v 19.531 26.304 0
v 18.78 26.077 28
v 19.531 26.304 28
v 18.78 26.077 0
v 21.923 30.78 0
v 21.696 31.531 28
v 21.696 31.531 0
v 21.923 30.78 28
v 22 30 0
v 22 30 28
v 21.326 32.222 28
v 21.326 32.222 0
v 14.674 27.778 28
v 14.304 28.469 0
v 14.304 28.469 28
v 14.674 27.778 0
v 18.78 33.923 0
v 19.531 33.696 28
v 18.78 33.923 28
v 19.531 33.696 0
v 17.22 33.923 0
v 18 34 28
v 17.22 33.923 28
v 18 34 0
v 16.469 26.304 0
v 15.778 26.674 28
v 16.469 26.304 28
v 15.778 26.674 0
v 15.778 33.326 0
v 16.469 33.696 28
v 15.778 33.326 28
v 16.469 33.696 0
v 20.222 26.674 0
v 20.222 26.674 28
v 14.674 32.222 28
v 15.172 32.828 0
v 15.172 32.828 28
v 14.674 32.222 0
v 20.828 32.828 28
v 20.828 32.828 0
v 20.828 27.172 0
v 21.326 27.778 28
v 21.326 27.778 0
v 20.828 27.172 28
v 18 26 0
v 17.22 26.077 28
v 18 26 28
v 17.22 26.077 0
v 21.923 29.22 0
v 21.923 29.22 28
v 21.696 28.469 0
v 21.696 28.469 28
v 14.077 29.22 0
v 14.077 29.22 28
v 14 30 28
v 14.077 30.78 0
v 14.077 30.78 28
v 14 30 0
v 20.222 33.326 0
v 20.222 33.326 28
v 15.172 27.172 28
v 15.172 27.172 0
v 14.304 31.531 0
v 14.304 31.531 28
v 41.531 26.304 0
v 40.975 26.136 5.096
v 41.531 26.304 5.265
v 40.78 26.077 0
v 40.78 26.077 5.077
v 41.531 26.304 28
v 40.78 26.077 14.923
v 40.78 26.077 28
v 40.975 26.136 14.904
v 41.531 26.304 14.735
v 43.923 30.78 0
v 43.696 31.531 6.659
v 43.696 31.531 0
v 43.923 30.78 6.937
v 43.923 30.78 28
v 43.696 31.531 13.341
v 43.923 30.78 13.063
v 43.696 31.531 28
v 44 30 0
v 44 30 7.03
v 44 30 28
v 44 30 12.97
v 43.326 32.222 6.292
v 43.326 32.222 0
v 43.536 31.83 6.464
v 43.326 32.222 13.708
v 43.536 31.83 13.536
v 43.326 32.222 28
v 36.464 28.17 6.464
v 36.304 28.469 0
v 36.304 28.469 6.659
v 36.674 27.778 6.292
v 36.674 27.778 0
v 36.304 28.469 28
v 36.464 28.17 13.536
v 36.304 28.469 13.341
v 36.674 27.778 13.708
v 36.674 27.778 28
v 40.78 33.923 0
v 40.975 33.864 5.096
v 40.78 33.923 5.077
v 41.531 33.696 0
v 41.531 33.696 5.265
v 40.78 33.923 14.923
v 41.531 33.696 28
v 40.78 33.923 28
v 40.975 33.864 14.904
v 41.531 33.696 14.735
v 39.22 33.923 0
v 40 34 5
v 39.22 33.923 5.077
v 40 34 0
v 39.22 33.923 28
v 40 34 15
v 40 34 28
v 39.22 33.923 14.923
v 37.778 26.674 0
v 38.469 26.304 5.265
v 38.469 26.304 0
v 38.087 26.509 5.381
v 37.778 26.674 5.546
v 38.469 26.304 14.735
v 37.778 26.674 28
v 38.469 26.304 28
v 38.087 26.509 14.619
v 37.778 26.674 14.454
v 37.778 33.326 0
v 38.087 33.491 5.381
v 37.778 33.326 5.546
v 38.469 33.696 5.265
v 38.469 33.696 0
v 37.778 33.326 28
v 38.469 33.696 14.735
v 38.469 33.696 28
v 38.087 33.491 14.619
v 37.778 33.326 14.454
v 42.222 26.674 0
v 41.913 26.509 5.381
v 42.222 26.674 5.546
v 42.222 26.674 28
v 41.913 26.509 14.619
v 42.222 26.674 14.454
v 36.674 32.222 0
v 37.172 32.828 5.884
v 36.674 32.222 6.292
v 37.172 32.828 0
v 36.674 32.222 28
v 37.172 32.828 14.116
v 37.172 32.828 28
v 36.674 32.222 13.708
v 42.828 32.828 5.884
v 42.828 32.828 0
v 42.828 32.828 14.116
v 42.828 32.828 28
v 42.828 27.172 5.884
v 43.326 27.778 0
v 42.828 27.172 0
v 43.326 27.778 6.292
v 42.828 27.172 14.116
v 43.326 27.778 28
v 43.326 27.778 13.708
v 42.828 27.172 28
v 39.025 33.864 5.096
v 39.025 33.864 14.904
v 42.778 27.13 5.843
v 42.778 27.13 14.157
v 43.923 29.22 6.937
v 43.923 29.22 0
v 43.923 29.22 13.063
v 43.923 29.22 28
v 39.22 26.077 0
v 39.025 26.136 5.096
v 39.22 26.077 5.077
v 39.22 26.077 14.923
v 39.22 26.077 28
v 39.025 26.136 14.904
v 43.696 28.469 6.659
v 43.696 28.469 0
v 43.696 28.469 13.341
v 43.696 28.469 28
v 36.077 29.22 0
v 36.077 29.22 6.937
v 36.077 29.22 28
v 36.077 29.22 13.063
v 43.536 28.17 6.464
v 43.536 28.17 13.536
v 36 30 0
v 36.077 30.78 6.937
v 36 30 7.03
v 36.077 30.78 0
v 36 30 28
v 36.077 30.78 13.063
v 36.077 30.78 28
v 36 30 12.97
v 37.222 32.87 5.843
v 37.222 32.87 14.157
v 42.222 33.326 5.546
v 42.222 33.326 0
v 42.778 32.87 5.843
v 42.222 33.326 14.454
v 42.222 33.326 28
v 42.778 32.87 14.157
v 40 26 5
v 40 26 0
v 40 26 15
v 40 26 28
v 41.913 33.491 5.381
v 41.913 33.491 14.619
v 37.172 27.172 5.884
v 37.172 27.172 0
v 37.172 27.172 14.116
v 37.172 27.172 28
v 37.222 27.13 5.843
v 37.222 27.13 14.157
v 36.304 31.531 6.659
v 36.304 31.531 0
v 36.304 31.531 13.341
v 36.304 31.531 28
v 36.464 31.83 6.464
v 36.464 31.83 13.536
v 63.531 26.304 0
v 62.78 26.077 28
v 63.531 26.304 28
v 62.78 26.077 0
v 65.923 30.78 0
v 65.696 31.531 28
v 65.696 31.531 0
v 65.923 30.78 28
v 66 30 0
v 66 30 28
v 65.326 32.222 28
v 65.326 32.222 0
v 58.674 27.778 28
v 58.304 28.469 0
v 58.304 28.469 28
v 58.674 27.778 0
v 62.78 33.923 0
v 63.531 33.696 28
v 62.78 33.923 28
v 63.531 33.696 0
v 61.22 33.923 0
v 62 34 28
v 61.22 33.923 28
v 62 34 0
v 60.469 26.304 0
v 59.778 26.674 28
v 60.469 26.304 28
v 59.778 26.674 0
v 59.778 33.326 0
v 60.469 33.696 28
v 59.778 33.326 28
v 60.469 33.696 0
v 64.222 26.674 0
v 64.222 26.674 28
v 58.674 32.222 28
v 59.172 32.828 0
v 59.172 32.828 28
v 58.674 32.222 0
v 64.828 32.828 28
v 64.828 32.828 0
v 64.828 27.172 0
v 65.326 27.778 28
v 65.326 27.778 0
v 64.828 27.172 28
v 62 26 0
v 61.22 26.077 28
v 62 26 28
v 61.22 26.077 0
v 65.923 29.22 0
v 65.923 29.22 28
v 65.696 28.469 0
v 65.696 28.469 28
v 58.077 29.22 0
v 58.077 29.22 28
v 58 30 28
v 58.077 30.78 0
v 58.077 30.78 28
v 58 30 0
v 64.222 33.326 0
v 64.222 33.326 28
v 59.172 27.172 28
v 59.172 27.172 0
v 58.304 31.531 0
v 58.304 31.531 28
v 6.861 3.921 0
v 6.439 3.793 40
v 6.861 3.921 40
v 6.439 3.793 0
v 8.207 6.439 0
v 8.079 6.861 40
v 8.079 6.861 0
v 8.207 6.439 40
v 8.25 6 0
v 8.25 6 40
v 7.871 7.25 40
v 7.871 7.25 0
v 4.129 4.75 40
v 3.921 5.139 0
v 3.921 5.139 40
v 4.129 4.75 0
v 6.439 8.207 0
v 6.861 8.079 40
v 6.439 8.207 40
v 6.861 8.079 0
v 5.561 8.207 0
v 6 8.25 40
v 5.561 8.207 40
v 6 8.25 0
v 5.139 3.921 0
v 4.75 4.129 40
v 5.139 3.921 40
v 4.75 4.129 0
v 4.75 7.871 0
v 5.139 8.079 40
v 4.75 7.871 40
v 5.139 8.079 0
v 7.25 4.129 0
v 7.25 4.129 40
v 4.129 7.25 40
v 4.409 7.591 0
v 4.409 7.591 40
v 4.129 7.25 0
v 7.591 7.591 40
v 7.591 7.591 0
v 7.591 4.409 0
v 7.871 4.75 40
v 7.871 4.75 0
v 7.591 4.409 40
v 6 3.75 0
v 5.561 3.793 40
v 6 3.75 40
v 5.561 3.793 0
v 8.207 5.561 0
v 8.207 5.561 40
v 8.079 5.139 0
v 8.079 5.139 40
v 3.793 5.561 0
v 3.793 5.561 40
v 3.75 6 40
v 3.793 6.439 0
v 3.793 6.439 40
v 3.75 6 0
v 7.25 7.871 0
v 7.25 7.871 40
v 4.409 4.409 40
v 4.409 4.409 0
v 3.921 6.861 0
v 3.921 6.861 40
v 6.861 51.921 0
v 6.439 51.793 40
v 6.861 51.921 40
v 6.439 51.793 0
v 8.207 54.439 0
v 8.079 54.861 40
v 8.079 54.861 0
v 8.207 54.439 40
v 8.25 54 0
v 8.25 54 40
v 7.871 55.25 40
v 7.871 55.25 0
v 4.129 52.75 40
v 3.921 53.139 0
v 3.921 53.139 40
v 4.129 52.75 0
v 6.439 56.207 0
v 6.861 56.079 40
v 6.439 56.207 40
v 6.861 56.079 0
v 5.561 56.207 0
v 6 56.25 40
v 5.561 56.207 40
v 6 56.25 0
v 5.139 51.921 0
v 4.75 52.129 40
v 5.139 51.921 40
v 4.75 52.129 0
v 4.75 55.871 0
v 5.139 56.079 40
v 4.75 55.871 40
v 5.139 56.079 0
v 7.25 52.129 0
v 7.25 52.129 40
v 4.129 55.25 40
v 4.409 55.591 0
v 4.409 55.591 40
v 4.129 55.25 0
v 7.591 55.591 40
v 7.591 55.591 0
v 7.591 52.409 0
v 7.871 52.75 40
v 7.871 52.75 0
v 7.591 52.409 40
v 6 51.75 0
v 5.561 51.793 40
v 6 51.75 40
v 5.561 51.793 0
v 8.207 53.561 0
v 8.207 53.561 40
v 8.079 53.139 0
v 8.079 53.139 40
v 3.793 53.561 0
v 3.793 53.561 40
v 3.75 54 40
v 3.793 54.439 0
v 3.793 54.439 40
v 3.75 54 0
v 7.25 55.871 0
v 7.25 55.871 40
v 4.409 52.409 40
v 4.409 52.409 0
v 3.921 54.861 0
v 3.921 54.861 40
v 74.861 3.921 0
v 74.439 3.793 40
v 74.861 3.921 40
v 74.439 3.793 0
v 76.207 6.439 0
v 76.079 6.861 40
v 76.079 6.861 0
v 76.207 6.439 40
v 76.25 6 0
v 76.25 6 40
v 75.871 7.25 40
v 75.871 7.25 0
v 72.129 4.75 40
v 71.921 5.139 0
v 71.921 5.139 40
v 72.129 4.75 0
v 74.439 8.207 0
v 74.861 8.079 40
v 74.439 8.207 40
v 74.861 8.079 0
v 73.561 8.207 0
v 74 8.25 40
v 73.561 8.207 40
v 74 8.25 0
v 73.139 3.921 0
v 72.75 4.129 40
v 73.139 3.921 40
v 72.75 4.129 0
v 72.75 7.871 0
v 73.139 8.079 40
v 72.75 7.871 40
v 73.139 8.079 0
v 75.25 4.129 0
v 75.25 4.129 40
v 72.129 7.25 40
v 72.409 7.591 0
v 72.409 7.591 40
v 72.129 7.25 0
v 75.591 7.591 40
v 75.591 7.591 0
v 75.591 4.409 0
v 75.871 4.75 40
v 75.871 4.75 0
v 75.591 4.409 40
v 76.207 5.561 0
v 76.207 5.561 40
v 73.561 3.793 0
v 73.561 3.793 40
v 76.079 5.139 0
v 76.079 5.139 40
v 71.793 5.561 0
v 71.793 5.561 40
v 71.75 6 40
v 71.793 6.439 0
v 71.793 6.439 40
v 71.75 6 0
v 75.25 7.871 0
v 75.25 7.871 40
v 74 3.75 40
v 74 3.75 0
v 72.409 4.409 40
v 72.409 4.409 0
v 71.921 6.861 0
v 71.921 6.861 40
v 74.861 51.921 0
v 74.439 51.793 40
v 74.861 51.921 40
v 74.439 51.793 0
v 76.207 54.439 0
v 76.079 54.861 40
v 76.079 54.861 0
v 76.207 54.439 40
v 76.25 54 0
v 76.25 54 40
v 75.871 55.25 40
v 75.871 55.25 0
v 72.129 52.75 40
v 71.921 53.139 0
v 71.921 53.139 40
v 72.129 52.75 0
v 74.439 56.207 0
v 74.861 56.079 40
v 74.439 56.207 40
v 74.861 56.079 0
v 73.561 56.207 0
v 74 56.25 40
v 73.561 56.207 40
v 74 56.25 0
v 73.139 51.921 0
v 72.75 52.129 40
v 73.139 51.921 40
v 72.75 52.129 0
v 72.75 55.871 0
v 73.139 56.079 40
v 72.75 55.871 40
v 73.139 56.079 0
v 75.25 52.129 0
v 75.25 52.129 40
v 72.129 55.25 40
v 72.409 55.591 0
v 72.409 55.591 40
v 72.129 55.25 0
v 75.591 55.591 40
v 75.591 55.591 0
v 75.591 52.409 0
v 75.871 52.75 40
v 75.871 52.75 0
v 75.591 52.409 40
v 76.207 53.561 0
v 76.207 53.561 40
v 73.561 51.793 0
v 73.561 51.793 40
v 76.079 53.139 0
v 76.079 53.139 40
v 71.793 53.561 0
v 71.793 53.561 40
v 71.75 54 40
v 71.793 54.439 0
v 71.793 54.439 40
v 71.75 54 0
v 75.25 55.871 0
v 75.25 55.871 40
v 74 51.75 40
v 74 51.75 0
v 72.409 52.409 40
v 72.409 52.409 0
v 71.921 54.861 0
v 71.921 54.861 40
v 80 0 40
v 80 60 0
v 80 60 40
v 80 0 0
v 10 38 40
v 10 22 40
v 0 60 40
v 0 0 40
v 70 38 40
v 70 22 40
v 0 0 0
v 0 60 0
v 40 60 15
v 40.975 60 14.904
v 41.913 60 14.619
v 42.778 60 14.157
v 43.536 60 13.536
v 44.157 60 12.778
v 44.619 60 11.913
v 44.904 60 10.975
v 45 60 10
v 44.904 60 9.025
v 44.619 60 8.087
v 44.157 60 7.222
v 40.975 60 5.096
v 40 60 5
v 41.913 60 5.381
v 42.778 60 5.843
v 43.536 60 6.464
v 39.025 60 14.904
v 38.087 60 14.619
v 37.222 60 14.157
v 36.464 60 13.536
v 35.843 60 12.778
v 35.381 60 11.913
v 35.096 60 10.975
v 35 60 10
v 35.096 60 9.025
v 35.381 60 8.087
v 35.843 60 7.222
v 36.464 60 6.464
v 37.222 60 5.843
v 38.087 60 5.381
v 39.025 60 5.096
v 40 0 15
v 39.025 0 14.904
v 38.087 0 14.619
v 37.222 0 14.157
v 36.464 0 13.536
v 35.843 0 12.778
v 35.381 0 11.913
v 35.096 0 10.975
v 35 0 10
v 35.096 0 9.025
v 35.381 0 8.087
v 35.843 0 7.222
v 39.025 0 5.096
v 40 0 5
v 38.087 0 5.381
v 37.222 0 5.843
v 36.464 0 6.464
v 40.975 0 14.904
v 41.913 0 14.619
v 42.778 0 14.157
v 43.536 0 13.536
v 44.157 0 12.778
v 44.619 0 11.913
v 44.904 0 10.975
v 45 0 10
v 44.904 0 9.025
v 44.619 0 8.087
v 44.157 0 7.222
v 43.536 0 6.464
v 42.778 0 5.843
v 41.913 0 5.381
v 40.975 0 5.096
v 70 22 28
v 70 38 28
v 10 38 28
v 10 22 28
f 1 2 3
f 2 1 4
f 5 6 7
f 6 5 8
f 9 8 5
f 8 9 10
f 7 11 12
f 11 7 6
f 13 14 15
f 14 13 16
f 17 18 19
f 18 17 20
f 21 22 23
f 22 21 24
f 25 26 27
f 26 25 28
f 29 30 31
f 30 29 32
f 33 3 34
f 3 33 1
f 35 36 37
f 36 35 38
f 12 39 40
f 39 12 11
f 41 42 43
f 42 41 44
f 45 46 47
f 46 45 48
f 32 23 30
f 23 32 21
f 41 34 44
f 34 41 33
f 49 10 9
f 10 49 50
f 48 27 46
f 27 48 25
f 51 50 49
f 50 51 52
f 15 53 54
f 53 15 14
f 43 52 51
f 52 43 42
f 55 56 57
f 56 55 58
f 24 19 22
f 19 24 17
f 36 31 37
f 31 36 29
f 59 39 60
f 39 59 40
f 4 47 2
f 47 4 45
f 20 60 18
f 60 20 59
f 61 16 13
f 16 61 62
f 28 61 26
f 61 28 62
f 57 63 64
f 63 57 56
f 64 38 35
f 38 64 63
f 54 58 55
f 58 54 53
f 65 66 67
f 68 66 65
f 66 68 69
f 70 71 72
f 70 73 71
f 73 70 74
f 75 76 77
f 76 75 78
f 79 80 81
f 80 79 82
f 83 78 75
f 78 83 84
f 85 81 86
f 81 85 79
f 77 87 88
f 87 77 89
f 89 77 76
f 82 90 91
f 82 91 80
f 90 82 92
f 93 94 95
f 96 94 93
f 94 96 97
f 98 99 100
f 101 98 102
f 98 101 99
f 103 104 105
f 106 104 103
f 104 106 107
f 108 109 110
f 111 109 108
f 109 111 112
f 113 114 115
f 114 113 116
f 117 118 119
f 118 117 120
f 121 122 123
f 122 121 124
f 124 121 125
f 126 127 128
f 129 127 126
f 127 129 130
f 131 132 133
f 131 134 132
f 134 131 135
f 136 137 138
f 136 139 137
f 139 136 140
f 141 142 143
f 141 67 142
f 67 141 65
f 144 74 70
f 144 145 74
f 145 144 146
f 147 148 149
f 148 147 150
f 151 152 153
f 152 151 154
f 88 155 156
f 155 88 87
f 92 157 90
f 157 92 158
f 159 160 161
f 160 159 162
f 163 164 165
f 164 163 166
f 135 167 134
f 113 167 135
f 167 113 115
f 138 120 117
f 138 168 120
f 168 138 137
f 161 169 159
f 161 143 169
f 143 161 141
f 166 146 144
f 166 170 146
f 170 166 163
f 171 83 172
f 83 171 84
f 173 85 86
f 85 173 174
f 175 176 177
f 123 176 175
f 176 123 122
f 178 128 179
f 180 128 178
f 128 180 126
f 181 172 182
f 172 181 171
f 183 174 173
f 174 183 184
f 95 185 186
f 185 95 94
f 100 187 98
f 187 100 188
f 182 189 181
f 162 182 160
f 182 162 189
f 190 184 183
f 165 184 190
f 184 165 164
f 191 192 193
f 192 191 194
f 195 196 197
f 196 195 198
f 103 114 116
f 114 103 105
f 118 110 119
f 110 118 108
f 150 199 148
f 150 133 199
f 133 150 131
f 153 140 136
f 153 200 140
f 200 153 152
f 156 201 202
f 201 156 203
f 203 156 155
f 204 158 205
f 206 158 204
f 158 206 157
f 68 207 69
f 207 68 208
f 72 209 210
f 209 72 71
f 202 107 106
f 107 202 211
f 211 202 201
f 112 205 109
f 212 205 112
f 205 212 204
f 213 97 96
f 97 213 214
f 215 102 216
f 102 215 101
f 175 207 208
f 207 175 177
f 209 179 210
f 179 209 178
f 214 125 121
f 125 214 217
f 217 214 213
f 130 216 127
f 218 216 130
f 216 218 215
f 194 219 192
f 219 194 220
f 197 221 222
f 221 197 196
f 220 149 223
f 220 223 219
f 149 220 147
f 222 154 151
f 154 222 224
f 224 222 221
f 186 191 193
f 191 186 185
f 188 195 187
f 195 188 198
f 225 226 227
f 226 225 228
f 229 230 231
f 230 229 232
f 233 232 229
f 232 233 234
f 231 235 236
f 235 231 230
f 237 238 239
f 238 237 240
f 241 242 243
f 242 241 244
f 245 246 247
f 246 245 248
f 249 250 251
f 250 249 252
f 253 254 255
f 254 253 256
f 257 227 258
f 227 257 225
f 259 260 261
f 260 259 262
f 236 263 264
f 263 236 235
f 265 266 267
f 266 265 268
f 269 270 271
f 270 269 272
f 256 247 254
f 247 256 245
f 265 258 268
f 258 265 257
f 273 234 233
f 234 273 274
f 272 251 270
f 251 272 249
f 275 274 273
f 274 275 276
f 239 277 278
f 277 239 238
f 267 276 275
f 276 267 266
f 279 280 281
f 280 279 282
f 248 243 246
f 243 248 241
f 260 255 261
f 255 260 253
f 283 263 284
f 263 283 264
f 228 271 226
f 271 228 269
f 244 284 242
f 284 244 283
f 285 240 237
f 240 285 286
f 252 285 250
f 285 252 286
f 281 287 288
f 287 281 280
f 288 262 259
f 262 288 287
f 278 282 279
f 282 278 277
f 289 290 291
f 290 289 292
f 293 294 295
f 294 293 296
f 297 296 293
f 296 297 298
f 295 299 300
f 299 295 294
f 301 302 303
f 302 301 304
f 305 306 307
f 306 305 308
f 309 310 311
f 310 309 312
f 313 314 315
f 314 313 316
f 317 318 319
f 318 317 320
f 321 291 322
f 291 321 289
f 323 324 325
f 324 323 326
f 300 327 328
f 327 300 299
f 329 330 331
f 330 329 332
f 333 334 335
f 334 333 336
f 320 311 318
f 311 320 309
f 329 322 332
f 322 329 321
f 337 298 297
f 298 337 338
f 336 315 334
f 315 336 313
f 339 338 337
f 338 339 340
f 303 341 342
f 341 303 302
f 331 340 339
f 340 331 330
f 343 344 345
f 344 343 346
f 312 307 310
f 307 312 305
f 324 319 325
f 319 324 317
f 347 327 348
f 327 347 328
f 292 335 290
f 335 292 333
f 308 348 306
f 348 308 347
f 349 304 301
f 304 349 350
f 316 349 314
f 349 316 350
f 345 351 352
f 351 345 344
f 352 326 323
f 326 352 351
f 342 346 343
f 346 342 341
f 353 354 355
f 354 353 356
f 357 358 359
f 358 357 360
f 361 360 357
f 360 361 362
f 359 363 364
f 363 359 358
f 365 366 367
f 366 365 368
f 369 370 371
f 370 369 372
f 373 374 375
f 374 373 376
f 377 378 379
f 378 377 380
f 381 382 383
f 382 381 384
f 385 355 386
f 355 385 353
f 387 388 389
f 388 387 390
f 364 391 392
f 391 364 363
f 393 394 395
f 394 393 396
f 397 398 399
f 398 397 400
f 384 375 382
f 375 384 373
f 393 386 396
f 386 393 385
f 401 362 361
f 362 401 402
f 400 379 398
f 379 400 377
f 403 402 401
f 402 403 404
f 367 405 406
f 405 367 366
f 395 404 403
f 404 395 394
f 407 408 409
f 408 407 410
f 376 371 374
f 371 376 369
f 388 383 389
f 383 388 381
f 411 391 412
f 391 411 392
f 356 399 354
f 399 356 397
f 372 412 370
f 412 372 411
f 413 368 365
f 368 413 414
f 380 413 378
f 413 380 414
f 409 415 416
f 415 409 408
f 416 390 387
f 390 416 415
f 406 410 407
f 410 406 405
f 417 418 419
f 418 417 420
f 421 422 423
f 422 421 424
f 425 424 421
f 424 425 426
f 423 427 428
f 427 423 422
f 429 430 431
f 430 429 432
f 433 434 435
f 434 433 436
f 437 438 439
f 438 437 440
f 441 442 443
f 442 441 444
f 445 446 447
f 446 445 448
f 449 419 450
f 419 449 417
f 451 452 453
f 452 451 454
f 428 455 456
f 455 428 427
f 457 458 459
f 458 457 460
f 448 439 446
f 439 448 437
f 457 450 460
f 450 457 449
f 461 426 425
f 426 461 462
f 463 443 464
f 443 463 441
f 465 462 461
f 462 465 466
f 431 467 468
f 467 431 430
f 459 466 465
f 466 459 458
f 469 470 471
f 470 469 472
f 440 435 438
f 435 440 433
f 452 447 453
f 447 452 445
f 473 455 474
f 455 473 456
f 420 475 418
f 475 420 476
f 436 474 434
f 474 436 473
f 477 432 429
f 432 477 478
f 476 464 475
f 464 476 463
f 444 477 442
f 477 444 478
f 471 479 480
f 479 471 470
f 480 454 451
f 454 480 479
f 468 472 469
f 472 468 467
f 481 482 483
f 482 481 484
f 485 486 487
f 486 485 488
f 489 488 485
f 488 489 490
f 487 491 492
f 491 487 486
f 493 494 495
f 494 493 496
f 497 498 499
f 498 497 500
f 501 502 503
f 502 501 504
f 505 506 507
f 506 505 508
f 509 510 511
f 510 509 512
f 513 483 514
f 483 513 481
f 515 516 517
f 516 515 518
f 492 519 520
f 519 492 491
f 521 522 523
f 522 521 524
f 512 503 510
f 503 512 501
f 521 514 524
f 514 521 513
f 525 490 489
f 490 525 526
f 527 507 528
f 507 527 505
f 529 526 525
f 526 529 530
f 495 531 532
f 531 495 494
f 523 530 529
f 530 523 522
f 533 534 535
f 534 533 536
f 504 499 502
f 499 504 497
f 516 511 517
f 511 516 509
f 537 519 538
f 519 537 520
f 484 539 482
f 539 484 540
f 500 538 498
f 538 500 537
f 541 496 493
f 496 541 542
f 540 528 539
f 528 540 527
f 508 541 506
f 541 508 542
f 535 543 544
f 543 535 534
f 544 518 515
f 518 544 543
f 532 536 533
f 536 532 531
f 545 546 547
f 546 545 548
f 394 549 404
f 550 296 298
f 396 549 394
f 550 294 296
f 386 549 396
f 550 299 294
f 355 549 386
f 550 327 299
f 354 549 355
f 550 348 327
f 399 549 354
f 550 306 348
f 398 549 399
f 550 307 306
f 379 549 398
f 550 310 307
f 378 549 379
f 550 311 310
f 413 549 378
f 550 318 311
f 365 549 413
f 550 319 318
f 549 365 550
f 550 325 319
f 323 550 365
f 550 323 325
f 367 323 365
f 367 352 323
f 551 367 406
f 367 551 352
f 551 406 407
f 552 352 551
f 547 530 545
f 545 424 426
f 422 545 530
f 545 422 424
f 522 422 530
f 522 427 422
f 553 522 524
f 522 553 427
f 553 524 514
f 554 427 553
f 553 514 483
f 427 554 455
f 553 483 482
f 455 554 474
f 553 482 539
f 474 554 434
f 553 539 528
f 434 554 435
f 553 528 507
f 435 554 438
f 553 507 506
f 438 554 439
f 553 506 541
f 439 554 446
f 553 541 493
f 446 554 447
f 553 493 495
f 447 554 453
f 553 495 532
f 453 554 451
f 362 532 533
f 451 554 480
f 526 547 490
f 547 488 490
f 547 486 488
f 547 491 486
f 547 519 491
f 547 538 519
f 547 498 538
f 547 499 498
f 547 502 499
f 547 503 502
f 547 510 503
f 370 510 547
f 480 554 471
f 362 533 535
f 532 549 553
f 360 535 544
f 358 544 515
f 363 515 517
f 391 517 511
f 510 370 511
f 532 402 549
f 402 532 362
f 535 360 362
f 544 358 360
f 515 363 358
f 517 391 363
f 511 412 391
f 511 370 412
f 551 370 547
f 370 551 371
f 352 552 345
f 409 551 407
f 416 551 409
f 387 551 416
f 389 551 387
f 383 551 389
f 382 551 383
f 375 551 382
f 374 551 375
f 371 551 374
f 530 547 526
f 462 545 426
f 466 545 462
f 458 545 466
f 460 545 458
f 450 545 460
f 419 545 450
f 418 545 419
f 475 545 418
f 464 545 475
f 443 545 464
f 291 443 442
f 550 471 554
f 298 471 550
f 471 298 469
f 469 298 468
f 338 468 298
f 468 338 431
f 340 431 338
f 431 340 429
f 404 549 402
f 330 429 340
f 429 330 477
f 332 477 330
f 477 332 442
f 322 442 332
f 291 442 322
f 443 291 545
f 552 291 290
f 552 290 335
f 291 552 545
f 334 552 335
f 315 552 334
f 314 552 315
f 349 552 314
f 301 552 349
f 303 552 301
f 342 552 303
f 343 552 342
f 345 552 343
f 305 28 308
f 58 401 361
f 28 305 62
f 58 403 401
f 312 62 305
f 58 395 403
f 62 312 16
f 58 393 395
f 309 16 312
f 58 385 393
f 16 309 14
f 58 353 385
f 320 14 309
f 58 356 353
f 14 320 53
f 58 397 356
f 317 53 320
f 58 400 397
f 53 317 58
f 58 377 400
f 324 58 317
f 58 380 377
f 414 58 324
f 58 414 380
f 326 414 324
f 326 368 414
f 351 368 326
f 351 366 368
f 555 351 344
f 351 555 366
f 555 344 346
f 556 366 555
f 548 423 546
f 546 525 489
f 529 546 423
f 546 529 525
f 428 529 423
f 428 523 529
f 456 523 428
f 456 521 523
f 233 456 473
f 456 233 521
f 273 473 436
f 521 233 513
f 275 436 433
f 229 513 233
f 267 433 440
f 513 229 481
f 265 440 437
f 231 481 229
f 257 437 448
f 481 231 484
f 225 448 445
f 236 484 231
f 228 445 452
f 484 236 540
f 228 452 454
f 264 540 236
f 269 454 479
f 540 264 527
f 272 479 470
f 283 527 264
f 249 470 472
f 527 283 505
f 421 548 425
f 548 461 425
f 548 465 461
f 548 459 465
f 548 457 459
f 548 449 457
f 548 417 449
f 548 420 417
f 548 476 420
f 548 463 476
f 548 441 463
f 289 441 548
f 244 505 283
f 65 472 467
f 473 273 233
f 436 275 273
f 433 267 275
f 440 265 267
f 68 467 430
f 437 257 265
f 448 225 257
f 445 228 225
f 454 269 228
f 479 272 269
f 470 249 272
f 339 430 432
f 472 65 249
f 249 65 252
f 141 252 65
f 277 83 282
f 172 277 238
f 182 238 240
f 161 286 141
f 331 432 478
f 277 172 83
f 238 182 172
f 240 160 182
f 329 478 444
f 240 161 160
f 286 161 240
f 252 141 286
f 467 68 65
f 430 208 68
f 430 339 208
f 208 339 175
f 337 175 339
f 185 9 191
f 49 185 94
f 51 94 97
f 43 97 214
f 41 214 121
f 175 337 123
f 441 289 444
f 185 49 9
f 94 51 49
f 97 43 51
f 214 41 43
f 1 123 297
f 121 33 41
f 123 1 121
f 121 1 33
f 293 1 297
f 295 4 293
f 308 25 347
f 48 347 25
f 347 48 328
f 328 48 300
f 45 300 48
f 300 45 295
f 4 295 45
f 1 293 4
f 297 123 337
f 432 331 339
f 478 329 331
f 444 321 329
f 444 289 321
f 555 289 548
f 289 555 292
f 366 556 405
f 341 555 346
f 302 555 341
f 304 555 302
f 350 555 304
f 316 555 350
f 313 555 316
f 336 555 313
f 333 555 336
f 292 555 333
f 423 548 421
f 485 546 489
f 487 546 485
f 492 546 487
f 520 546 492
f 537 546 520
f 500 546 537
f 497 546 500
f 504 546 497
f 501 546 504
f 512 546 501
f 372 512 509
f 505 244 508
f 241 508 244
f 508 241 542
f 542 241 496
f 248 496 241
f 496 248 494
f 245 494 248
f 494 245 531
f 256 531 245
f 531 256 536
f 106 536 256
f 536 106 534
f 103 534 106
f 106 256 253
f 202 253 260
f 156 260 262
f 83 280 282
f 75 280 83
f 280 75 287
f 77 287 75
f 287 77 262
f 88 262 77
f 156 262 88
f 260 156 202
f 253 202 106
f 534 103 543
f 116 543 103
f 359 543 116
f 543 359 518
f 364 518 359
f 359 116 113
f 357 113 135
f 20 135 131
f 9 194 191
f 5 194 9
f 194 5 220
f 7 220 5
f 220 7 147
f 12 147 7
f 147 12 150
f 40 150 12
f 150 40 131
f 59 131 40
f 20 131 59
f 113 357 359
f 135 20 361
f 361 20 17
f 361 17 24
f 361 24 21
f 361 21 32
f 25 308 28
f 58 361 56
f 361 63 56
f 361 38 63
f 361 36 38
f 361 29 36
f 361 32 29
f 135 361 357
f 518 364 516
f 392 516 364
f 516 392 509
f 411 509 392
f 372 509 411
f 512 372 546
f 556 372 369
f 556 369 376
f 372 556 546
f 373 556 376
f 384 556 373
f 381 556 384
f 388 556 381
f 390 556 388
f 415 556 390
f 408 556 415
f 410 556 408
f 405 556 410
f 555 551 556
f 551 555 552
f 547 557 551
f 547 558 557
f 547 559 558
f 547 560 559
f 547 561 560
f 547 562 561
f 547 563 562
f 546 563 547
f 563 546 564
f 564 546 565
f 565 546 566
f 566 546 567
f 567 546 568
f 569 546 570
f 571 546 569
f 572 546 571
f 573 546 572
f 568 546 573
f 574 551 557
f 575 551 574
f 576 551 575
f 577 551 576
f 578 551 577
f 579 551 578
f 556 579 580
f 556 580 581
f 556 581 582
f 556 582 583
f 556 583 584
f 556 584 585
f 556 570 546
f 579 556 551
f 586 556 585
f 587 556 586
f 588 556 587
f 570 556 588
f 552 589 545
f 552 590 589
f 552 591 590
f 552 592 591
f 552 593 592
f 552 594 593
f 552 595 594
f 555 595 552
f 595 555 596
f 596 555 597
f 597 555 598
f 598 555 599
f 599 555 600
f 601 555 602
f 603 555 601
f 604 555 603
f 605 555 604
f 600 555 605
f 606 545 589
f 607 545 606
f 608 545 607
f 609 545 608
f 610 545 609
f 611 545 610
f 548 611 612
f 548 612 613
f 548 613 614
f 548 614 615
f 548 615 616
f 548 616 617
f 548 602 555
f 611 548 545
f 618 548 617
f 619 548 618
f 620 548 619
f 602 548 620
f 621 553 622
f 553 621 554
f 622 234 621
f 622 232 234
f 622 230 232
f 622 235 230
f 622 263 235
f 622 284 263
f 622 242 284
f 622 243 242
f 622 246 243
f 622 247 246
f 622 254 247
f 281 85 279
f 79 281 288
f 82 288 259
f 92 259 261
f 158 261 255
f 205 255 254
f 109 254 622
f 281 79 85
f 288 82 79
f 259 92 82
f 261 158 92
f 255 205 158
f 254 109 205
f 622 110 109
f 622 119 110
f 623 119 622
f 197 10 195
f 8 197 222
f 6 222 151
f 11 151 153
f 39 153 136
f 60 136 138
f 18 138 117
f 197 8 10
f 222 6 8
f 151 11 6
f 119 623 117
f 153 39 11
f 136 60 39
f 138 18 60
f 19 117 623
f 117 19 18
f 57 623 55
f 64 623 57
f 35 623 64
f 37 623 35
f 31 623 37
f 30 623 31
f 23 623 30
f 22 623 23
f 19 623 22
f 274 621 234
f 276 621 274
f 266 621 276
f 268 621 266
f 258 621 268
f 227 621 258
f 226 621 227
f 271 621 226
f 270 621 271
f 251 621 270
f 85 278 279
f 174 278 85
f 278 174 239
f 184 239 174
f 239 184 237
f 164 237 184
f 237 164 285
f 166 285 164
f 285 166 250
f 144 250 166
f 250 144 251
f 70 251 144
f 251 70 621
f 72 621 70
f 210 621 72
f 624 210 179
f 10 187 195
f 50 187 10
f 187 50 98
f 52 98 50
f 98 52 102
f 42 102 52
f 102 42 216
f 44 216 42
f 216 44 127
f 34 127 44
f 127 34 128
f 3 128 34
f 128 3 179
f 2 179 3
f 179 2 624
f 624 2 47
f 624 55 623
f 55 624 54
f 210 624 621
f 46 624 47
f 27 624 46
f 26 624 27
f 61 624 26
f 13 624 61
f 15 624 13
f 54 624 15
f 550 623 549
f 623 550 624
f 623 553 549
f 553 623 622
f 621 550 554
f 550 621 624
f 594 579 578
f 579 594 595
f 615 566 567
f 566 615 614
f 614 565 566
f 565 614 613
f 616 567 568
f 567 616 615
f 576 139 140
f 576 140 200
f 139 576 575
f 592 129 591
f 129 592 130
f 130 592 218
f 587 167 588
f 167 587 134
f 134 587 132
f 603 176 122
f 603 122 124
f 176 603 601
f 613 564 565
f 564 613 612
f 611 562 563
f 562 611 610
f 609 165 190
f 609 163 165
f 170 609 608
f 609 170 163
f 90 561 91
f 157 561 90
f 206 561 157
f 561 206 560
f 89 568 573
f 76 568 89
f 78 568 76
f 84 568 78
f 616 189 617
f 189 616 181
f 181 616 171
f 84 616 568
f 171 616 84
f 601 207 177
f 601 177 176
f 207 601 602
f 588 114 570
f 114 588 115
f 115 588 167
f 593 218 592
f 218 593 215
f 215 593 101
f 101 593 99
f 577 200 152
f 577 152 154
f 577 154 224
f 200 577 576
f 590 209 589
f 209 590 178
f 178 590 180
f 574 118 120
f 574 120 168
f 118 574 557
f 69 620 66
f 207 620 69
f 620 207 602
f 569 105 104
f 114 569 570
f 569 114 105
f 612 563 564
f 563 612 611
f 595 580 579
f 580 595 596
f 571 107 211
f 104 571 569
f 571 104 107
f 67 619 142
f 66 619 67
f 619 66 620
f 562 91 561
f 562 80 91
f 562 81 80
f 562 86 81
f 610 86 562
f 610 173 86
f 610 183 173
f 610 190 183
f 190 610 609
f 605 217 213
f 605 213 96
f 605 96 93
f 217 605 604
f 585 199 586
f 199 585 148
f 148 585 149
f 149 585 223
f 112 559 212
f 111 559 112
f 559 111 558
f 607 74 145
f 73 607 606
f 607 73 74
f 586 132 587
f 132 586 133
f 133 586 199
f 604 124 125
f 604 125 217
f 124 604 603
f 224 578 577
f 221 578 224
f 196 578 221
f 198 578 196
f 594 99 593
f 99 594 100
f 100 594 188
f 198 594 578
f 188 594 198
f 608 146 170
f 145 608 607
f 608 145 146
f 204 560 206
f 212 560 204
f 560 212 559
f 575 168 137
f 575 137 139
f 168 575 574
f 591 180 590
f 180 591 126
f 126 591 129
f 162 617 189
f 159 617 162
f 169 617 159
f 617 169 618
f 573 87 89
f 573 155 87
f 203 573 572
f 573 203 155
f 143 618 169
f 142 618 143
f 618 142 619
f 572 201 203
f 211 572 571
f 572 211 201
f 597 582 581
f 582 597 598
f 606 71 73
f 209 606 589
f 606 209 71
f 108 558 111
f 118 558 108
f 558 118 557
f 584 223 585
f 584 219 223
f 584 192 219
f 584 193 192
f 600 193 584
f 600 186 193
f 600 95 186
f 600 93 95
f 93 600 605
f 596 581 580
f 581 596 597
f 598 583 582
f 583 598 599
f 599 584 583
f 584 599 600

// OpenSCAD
$fn = 32;

// ----------------------------------------------------------------------
// Manifold block: side_outlet manifold
// ----------------------------------------------------------------------

// --- parameters (mm) ---
block_l = 80;             // block length, X
block_w = 60;             // block width, Y
block_h = 40;             // block height, Z
port_d = 8;               // port bore diameter
port_pitch = 22;          // port pitch along X
gallery_d = 16;           // top gallery width, Y
gallery_depth = 12;       // gallery pocket depth
wall_p = 10;              // gallery end wall thickness, X
mnt_d = 4.5;              // mounting hole diameter
mnt_in = 6;               // mounting hole inset from the edges
out_d = 10;               // outlet bore diameter
out_z = 10;               // outlet axis height

n_ports = 3;  // ports in the row
port_x0 = (block_l - (n_ports - 1) * port_pitch) / 2;  // first port X

difference() {
  cube([block_l, block_w, block_h]);
  for (i = [0 : n_ports - 1])
    translate([port_x0 + i * port_pitch, block_w / 2, -1])
      cylinder(h = block_h + 2, d = port_d);
  translate([wall_p, block_w / 2 - gallery_d / 2, block_h - gallery_depth])
    cube([block_l - 2 * wall_p, gallery_d, gallery_depth + 1]);
  for (cx = [mnt_in, block_l - mnt_in])
    for (cy = [mnt_in, block_w - mnt_in])
      translate([cx, cy, -1]) cylinder(h = block_h + 2, d = mnt_d);
  translate([block_l / 2, -1, out_z]) rotate([-90, 0, 0])
    cylinder(h = block_w + 2, d = out_d);
}
